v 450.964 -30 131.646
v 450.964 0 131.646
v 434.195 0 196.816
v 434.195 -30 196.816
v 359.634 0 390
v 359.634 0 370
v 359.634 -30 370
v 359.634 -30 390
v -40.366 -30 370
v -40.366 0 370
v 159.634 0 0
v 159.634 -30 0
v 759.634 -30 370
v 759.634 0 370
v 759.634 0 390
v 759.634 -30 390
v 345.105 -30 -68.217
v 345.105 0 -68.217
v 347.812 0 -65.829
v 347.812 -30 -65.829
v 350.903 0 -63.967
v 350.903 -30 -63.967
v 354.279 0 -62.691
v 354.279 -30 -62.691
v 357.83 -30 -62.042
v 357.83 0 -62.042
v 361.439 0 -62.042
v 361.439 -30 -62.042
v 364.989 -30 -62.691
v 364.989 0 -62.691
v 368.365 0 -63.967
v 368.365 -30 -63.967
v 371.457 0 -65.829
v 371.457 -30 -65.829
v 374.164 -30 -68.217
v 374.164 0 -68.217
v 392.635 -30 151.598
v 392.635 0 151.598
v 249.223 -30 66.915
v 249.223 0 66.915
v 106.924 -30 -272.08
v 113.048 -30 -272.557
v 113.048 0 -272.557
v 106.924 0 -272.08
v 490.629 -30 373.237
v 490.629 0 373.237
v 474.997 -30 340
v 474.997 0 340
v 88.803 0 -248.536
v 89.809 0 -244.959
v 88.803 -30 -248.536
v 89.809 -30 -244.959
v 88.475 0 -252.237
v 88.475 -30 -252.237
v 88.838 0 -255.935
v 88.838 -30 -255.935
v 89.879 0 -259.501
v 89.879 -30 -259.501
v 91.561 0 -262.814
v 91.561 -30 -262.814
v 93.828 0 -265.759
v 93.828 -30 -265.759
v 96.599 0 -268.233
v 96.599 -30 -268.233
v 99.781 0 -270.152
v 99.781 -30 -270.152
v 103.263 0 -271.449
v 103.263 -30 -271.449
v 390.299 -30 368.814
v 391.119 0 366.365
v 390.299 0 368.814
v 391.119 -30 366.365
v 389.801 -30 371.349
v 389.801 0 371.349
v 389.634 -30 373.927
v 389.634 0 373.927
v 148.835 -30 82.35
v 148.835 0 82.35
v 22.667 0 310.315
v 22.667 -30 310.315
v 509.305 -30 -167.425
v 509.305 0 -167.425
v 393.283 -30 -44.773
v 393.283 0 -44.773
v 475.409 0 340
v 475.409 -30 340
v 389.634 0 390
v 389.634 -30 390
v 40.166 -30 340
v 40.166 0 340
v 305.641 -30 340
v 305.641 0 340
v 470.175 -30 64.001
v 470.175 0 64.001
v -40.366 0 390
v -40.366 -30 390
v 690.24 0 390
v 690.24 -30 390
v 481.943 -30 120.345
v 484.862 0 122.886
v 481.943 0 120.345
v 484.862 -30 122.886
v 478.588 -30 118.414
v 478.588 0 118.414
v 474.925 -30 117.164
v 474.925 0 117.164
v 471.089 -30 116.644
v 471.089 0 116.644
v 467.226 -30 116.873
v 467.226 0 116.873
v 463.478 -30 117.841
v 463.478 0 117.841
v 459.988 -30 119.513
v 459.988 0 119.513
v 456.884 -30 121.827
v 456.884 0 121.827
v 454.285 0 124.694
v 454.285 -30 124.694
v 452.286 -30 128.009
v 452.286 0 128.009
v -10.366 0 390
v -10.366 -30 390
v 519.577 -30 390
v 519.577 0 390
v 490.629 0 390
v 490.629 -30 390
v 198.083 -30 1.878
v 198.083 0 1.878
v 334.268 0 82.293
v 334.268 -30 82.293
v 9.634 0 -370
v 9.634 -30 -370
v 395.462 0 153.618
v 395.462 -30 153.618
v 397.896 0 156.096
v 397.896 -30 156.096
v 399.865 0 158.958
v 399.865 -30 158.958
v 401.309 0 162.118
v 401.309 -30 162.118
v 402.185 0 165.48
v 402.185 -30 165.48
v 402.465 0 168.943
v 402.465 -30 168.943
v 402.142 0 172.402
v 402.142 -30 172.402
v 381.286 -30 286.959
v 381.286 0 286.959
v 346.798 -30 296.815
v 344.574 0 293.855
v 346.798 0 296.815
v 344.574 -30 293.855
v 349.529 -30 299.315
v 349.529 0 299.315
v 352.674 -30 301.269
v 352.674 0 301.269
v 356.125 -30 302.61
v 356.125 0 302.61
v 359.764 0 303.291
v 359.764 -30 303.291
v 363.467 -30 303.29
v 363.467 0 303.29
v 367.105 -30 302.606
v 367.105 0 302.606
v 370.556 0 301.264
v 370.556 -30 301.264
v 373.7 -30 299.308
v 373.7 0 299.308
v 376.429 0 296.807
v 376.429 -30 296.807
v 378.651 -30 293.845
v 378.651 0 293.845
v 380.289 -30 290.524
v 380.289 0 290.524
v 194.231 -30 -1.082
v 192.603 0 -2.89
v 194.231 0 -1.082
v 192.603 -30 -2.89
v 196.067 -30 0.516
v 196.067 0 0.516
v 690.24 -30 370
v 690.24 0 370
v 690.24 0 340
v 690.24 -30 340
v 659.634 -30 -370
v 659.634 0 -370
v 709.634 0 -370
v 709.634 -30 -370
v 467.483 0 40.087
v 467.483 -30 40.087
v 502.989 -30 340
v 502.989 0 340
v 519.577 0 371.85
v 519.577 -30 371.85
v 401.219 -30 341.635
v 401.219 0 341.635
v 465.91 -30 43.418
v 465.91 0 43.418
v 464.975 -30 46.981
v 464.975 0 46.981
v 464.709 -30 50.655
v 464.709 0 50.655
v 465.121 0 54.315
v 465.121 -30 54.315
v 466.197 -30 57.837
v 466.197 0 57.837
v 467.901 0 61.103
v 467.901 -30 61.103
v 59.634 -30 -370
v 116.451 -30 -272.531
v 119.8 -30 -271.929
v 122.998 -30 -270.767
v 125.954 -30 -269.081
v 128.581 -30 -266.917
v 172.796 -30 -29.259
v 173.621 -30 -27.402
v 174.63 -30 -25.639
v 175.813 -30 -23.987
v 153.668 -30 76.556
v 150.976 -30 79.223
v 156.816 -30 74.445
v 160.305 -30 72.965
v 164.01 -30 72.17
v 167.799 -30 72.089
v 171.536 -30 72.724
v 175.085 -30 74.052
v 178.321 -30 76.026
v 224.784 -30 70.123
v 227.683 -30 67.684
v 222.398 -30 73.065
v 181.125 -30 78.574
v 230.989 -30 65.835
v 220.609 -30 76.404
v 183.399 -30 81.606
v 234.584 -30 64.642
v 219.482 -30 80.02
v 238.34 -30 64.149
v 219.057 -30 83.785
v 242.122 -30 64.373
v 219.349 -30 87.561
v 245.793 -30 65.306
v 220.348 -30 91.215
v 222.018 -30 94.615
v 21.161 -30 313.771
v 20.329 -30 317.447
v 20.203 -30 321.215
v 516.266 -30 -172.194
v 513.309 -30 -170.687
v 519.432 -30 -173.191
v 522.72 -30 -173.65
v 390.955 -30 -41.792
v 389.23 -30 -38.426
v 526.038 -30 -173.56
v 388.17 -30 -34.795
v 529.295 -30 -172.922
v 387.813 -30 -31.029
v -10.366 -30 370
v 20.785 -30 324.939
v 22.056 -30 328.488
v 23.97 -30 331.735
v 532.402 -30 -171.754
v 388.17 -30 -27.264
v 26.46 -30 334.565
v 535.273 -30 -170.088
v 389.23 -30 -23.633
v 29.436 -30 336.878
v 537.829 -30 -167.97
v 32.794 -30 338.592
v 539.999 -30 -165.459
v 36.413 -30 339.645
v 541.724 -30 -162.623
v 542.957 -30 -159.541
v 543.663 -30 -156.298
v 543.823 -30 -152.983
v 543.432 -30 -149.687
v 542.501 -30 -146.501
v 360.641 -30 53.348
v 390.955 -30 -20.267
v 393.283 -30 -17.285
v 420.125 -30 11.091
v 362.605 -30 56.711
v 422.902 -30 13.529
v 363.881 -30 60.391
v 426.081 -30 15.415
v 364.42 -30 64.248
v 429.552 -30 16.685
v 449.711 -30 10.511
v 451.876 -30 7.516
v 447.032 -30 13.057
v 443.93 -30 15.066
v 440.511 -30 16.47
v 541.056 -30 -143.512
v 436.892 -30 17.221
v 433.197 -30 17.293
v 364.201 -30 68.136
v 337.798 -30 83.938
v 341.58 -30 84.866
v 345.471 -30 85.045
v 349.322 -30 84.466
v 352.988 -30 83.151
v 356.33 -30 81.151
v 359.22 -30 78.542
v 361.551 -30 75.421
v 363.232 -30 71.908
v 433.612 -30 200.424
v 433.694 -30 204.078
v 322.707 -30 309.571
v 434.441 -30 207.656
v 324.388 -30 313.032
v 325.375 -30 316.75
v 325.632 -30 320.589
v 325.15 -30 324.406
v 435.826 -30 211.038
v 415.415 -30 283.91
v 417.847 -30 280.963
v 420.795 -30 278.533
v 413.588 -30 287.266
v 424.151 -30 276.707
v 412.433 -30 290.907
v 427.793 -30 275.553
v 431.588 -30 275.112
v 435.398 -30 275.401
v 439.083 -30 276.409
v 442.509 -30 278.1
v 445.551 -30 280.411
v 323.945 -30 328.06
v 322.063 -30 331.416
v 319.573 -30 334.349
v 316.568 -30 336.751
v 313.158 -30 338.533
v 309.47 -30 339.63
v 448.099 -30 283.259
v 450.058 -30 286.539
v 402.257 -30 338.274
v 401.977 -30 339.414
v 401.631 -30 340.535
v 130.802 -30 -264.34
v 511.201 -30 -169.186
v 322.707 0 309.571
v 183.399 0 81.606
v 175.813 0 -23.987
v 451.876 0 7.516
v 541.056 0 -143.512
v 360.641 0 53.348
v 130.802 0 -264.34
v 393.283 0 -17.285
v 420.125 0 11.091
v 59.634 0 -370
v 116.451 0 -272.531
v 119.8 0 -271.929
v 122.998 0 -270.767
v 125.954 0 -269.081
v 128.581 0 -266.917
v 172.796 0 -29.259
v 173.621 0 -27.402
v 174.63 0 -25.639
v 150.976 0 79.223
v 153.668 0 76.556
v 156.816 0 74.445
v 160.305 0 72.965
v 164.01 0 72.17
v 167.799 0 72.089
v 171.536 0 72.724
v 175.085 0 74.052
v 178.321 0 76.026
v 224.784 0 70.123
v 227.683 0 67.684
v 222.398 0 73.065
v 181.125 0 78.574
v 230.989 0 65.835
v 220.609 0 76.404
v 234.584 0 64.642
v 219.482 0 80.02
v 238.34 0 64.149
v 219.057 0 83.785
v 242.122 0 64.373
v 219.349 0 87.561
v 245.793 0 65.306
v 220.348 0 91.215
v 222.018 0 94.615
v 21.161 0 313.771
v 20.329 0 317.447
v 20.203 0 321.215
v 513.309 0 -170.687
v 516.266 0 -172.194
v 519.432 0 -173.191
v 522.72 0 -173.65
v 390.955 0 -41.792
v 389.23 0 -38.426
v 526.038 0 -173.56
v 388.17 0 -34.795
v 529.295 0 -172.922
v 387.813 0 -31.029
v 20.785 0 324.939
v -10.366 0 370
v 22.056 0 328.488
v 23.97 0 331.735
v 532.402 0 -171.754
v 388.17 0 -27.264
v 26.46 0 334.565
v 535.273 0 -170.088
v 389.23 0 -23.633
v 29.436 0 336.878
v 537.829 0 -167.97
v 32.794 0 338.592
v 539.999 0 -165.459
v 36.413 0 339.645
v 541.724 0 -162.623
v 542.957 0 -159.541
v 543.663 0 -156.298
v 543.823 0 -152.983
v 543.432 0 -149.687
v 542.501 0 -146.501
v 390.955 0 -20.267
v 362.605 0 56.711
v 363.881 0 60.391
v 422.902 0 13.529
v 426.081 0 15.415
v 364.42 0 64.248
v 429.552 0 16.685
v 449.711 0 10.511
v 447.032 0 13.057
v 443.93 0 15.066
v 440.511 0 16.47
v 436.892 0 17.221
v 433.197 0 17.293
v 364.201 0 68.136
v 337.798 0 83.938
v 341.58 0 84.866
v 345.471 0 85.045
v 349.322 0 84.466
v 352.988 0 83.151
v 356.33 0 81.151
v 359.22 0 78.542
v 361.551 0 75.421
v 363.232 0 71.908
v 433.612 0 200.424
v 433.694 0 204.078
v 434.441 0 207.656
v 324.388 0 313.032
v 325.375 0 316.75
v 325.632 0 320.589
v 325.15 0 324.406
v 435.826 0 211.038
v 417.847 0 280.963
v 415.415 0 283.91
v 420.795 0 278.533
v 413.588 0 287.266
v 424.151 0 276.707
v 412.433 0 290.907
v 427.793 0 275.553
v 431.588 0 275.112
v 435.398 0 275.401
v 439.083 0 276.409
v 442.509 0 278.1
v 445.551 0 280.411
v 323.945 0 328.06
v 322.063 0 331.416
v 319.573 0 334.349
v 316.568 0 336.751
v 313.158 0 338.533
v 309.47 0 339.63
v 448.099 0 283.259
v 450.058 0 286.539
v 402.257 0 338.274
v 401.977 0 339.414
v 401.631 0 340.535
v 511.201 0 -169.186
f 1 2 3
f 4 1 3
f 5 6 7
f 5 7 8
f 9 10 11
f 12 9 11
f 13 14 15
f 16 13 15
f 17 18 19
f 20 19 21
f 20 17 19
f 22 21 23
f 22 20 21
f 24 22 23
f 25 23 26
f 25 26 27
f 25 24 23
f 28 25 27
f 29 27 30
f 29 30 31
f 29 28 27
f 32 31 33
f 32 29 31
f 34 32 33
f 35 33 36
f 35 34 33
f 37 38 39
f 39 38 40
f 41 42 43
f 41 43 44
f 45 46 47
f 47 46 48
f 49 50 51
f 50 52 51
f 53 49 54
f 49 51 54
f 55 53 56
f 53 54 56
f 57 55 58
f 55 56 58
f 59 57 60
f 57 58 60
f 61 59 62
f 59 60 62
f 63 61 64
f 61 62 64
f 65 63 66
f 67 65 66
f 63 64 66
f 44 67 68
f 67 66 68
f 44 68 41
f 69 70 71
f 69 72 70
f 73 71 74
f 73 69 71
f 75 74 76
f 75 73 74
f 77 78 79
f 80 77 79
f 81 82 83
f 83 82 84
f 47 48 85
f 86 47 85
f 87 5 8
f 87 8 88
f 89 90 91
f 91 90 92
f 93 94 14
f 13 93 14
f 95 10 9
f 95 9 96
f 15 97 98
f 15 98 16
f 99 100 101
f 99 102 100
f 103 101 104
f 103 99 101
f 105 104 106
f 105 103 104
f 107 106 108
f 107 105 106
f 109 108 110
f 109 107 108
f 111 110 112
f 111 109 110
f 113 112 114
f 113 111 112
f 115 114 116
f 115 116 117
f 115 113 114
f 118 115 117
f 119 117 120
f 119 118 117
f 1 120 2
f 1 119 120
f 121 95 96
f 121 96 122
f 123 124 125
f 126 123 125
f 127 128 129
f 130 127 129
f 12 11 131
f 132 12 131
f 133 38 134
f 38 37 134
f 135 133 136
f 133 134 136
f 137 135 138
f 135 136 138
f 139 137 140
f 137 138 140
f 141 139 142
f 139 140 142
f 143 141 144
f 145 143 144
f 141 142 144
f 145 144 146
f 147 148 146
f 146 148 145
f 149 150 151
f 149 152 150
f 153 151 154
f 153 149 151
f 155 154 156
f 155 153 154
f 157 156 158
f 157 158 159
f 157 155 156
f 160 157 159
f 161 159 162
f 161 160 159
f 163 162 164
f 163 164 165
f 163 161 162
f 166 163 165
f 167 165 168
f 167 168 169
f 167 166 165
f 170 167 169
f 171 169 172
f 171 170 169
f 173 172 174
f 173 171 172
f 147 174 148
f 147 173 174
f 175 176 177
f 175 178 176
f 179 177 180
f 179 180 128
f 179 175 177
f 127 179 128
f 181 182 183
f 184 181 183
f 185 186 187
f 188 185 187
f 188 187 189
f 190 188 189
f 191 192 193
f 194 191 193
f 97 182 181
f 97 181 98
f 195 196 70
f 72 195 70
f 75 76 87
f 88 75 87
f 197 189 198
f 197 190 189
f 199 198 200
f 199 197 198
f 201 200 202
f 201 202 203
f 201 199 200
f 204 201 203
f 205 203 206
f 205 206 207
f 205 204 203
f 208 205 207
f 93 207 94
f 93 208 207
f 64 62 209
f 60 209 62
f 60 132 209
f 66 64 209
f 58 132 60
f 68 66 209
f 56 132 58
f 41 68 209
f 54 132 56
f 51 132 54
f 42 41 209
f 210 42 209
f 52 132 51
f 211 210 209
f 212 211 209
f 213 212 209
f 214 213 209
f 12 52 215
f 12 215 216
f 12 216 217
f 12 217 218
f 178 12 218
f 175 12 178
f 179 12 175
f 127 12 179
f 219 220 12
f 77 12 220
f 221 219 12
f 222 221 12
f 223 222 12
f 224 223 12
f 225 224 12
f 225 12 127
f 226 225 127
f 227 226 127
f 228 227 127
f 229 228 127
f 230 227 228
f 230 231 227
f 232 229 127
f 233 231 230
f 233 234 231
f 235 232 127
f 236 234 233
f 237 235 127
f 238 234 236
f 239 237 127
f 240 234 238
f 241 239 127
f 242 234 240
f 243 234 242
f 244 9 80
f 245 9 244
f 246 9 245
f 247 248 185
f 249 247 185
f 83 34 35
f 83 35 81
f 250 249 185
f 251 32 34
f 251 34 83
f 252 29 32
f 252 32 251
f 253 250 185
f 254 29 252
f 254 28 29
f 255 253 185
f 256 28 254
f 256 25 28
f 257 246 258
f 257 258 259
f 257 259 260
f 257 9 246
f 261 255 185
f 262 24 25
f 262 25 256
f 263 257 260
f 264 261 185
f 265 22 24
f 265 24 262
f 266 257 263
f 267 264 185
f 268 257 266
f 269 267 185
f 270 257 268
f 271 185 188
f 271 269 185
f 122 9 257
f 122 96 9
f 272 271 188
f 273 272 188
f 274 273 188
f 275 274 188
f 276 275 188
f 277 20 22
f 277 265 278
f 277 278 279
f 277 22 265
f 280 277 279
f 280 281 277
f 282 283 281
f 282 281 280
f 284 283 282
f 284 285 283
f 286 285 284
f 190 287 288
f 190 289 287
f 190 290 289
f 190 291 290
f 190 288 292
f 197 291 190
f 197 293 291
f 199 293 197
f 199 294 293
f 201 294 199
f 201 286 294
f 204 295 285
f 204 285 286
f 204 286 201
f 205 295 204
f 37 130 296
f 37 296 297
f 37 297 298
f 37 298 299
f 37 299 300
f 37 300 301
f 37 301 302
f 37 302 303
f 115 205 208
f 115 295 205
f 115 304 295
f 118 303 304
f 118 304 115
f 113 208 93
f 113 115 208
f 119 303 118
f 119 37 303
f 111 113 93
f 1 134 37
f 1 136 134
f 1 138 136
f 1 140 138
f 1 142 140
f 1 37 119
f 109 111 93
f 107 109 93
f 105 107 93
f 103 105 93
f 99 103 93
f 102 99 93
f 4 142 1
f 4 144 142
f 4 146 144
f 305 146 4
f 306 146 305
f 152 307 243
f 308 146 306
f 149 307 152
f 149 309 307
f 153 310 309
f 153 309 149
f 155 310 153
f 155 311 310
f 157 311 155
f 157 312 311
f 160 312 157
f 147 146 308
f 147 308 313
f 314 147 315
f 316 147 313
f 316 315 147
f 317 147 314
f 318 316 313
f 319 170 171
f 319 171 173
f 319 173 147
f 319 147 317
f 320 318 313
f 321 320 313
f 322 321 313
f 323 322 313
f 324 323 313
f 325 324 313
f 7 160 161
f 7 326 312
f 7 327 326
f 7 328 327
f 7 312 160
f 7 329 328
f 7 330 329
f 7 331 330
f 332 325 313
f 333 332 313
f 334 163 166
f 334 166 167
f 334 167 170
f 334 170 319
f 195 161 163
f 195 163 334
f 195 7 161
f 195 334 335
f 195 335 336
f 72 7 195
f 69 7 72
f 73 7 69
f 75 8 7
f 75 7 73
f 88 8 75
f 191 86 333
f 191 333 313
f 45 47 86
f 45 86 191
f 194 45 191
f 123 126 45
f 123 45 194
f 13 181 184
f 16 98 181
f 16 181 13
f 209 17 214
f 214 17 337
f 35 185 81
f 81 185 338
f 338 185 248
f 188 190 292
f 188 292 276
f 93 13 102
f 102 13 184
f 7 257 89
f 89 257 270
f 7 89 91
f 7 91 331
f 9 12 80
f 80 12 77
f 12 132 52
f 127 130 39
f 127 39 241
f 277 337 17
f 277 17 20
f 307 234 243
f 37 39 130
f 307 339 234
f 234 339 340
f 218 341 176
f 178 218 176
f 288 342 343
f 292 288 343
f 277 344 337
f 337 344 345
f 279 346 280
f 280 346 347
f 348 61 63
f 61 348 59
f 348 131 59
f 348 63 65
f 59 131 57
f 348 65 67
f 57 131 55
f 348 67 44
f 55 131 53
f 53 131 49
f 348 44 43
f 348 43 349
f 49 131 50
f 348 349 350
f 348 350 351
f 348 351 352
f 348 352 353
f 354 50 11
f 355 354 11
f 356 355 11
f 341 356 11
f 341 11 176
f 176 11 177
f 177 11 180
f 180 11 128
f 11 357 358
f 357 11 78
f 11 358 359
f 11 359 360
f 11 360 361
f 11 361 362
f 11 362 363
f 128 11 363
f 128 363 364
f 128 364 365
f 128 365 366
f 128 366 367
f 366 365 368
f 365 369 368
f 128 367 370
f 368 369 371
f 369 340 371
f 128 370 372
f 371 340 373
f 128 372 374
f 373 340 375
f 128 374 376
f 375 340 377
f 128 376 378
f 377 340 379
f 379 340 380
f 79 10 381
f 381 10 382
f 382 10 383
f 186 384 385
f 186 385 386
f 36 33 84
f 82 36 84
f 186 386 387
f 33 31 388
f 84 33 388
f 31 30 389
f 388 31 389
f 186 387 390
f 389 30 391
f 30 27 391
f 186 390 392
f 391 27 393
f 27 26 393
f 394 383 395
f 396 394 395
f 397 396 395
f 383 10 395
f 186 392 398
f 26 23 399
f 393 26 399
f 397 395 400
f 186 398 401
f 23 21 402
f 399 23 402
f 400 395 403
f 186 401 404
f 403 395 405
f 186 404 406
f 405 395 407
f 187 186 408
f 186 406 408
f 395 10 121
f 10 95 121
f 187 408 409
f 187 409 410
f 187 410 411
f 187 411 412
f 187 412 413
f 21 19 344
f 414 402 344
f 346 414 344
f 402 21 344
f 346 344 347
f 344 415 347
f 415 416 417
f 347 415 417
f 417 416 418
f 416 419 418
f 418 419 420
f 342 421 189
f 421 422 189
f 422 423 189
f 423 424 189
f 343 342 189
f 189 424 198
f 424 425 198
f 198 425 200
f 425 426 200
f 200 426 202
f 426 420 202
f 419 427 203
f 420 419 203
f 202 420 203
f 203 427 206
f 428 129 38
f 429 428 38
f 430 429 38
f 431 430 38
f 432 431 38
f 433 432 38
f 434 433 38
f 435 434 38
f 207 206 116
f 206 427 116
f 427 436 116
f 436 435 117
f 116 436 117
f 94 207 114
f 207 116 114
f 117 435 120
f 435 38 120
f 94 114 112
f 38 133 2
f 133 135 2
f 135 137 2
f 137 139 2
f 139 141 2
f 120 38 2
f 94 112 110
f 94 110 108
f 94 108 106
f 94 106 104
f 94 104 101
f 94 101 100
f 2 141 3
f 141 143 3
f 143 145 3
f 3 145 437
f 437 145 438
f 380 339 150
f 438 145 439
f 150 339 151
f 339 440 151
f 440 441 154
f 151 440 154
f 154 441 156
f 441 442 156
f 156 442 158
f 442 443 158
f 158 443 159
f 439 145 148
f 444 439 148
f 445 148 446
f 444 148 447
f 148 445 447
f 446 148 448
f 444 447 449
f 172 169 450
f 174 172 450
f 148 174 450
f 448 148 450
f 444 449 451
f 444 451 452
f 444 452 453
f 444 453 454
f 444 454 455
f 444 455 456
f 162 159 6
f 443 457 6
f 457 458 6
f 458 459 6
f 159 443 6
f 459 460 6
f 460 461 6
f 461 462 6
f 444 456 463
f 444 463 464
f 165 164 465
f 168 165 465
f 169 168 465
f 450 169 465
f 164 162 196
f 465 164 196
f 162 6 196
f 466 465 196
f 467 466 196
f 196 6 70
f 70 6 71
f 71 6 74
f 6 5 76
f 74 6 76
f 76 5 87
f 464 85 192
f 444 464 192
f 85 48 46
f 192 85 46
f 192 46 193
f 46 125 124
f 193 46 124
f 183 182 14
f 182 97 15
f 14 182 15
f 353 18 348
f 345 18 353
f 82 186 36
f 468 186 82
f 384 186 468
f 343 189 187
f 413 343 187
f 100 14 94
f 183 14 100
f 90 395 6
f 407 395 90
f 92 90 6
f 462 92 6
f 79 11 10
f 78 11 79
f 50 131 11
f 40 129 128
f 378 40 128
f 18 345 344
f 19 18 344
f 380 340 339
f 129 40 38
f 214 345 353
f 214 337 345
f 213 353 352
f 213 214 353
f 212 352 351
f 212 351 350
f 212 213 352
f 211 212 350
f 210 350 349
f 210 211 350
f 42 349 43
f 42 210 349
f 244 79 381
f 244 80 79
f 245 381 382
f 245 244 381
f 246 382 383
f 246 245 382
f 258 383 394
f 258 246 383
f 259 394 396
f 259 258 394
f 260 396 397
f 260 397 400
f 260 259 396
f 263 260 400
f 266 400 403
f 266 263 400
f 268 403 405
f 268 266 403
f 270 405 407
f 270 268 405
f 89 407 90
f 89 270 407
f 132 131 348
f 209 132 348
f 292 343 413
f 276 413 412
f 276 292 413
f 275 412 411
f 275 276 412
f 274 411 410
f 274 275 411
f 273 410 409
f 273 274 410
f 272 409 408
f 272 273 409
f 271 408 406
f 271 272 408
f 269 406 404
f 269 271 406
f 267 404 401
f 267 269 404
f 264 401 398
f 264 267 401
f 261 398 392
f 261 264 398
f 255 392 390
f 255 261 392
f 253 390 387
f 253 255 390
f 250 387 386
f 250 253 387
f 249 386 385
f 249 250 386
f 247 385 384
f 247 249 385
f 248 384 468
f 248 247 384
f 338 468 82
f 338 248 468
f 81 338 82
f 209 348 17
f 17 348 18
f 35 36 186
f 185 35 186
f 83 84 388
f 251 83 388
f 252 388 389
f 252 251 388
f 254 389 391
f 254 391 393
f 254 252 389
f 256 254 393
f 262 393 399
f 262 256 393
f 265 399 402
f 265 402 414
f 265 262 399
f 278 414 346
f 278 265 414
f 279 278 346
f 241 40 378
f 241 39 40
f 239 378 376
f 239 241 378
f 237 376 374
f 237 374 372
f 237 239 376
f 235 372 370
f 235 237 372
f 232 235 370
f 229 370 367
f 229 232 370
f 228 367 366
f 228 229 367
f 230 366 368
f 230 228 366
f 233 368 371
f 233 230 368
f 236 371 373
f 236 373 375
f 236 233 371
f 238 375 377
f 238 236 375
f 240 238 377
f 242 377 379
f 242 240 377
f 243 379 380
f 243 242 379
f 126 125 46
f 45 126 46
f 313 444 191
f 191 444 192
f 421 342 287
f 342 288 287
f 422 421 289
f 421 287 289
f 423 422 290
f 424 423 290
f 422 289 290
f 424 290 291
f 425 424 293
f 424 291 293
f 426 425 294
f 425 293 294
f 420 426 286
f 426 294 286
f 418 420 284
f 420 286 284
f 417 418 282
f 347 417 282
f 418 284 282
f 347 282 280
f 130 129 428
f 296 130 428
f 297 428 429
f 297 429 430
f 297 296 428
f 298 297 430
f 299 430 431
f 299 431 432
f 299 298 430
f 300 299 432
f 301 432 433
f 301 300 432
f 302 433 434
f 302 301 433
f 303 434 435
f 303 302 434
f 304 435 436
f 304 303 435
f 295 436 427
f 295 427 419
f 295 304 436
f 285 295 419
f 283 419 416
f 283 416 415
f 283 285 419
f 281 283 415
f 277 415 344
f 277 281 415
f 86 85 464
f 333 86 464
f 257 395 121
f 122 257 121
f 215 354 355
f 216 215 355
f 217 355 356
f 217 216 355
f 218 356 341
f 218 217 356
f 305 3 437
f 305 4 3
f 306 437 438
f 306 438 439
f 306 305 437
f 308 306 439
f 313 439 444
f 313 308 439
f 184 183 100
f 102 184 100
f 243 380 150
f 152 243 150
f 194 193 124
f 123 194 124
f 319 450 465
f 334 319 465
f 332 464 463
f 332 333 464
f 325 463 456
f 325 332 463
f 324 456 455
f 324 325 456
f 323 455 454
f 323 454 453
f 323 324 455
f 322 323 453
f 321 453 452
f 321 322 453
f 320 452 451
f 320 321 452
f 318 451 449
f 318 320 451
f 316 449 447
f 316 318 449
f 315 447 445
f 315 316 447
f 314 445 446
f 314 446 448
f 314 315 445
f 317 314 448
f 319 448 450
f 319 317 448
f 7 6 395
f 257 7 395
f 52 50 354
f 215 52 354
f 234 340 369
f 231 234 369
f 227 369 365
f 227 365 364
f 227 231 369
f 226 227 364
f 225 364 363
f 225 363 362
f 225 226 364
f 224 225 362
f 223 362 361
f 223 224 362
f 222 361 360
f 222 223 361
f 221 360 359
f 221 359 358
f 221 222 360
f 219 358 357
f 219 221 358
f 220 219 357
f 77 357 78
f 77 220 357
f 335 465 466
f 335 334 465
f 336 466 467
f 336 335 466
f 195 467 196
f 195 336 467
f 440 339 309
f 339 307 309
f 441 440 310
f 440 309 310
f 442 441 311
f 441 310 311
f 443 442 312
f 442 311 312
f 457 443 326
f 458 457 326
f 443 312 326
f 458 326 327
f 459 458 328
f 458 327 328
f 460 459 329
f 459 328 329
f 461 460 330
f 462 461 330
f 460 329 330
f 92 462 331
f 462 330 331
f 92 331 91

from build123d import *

# Parameters (mm, degrees)
F0_W     = 30
F0_H     = 20
F0_W_2   = 69.394279
F1_DEPTH = 30
F2_R     = 20


with BuildPart() as f1:
    # F0 (on Front) → F1 (new body)
    with BuildSketch(Plane.XZ):
        Polygon((159.634272, 0), (9.634272, -370), (59.634272, -370), (359.634272, -52.857143), (380.282107, -31.029432), (359.634272, -9.20172), (359.634272, 0), (419.442074, 58.0528), (425.315722, 52.496647), (438.374084, 30.382087), (459.824098, 53.057817), (759.634272, 370), (690.239993, 370), (690.239993, 340), (459.984443, 96.58699), (432.284971, 204.239834), (502.989308, 340), (475.40856, 340), (424.809358, 233.293495), (401.886582, 340), (389.634272, 370), (359.634272, 370), (-10.365728, 370), (-40.365728, 370), align=None)
        Polygon((173.899783, -26.391195), (194.902527, 0), (416.868696, 131.068154), (124.228867, -273.426068), (80.174812, -270), align=None, mode=Mode.SUBTRACT)
        Polygon((165.477519, 52.279216), (6.237836, 340), (341.3015, 340), align=None, mode=Mode.SUBTRACT)
        Polygon((179.74303, 25.888021), (371.932986, 338.332056), (404.63926, 158.686339), align=None, mode=Mode.SUBTRACT)
        Polygon((490.629017, 373.237222), (474.996572, 340), (475.40856, 340), (502.989308, 340), (519.577146, 371.850489), align=None)
        Polygon((490.629017, 390), (490.629017, 373.237222), (519.577146, 371.850489), (519.577146, 390), align=None)
        with Locations((374.634272, 380)):
            Rectangle(F0_W, F0_H)
        with Locations((724.937132, 380)):
            Rectangle(F0_W_2, F0_H)
        with Locations((-25.365728, 380)):
            Rectangle(F0_W, F0_H)
        Polygon((380.282107, -31.029432), (359.634272, -52.857143), (659.634272, -370), (709.634272, -370), (459.824098, 53.057817), (438.374084, 30.382087), (617.768873, -273.426068), (546.664514, -206.919405), align=None)
        Polygon((359.634272, -9.20172), (380.282107, -31.029432), (438.374084, 30.382087), (425.315722, 52.496647), (419.442074, 58.0528), (359.634272, 0), align=None)
    extrude(amount=F1_DEPTH)

    # F2
    f2_edges = [f1.edges().sort_by_distance(p)[0] for p in [
        (173.899783, -15, -26.391195),
        (194.902527, -15, 0),
        (416.868696, -15, 131.068154),
        (124.228867, -15, -273.426068),
        (80.174812, -15, -270),
        (179.74303, -15, 25.888021),
        (432.284971, -15, 204.239834),
        (459.984443, -15, 96.58699),
        (424.809358, -15, 233.293495),
        (371.932986, -15, 338.332056),
        (165.477519, -15, 52.279216),
        (6.237836, -15, 340),
        (341.3015, -15, 340),
        (404.63926, -15, 158.686339),
        (617.768873, -15, -273.426068),
        (438.374084, -15, 30.382087),
        (380.282107, -15, -31.029432),
        (359.634272, -15, -52.857143),
        (459.824098, -15, 53.057817),
        (401.886582, -15, 340),
        (389.634272, -15, 370),
    ]]
    fillet(f2_edges, radius=F2_R)


solid = f1.part
